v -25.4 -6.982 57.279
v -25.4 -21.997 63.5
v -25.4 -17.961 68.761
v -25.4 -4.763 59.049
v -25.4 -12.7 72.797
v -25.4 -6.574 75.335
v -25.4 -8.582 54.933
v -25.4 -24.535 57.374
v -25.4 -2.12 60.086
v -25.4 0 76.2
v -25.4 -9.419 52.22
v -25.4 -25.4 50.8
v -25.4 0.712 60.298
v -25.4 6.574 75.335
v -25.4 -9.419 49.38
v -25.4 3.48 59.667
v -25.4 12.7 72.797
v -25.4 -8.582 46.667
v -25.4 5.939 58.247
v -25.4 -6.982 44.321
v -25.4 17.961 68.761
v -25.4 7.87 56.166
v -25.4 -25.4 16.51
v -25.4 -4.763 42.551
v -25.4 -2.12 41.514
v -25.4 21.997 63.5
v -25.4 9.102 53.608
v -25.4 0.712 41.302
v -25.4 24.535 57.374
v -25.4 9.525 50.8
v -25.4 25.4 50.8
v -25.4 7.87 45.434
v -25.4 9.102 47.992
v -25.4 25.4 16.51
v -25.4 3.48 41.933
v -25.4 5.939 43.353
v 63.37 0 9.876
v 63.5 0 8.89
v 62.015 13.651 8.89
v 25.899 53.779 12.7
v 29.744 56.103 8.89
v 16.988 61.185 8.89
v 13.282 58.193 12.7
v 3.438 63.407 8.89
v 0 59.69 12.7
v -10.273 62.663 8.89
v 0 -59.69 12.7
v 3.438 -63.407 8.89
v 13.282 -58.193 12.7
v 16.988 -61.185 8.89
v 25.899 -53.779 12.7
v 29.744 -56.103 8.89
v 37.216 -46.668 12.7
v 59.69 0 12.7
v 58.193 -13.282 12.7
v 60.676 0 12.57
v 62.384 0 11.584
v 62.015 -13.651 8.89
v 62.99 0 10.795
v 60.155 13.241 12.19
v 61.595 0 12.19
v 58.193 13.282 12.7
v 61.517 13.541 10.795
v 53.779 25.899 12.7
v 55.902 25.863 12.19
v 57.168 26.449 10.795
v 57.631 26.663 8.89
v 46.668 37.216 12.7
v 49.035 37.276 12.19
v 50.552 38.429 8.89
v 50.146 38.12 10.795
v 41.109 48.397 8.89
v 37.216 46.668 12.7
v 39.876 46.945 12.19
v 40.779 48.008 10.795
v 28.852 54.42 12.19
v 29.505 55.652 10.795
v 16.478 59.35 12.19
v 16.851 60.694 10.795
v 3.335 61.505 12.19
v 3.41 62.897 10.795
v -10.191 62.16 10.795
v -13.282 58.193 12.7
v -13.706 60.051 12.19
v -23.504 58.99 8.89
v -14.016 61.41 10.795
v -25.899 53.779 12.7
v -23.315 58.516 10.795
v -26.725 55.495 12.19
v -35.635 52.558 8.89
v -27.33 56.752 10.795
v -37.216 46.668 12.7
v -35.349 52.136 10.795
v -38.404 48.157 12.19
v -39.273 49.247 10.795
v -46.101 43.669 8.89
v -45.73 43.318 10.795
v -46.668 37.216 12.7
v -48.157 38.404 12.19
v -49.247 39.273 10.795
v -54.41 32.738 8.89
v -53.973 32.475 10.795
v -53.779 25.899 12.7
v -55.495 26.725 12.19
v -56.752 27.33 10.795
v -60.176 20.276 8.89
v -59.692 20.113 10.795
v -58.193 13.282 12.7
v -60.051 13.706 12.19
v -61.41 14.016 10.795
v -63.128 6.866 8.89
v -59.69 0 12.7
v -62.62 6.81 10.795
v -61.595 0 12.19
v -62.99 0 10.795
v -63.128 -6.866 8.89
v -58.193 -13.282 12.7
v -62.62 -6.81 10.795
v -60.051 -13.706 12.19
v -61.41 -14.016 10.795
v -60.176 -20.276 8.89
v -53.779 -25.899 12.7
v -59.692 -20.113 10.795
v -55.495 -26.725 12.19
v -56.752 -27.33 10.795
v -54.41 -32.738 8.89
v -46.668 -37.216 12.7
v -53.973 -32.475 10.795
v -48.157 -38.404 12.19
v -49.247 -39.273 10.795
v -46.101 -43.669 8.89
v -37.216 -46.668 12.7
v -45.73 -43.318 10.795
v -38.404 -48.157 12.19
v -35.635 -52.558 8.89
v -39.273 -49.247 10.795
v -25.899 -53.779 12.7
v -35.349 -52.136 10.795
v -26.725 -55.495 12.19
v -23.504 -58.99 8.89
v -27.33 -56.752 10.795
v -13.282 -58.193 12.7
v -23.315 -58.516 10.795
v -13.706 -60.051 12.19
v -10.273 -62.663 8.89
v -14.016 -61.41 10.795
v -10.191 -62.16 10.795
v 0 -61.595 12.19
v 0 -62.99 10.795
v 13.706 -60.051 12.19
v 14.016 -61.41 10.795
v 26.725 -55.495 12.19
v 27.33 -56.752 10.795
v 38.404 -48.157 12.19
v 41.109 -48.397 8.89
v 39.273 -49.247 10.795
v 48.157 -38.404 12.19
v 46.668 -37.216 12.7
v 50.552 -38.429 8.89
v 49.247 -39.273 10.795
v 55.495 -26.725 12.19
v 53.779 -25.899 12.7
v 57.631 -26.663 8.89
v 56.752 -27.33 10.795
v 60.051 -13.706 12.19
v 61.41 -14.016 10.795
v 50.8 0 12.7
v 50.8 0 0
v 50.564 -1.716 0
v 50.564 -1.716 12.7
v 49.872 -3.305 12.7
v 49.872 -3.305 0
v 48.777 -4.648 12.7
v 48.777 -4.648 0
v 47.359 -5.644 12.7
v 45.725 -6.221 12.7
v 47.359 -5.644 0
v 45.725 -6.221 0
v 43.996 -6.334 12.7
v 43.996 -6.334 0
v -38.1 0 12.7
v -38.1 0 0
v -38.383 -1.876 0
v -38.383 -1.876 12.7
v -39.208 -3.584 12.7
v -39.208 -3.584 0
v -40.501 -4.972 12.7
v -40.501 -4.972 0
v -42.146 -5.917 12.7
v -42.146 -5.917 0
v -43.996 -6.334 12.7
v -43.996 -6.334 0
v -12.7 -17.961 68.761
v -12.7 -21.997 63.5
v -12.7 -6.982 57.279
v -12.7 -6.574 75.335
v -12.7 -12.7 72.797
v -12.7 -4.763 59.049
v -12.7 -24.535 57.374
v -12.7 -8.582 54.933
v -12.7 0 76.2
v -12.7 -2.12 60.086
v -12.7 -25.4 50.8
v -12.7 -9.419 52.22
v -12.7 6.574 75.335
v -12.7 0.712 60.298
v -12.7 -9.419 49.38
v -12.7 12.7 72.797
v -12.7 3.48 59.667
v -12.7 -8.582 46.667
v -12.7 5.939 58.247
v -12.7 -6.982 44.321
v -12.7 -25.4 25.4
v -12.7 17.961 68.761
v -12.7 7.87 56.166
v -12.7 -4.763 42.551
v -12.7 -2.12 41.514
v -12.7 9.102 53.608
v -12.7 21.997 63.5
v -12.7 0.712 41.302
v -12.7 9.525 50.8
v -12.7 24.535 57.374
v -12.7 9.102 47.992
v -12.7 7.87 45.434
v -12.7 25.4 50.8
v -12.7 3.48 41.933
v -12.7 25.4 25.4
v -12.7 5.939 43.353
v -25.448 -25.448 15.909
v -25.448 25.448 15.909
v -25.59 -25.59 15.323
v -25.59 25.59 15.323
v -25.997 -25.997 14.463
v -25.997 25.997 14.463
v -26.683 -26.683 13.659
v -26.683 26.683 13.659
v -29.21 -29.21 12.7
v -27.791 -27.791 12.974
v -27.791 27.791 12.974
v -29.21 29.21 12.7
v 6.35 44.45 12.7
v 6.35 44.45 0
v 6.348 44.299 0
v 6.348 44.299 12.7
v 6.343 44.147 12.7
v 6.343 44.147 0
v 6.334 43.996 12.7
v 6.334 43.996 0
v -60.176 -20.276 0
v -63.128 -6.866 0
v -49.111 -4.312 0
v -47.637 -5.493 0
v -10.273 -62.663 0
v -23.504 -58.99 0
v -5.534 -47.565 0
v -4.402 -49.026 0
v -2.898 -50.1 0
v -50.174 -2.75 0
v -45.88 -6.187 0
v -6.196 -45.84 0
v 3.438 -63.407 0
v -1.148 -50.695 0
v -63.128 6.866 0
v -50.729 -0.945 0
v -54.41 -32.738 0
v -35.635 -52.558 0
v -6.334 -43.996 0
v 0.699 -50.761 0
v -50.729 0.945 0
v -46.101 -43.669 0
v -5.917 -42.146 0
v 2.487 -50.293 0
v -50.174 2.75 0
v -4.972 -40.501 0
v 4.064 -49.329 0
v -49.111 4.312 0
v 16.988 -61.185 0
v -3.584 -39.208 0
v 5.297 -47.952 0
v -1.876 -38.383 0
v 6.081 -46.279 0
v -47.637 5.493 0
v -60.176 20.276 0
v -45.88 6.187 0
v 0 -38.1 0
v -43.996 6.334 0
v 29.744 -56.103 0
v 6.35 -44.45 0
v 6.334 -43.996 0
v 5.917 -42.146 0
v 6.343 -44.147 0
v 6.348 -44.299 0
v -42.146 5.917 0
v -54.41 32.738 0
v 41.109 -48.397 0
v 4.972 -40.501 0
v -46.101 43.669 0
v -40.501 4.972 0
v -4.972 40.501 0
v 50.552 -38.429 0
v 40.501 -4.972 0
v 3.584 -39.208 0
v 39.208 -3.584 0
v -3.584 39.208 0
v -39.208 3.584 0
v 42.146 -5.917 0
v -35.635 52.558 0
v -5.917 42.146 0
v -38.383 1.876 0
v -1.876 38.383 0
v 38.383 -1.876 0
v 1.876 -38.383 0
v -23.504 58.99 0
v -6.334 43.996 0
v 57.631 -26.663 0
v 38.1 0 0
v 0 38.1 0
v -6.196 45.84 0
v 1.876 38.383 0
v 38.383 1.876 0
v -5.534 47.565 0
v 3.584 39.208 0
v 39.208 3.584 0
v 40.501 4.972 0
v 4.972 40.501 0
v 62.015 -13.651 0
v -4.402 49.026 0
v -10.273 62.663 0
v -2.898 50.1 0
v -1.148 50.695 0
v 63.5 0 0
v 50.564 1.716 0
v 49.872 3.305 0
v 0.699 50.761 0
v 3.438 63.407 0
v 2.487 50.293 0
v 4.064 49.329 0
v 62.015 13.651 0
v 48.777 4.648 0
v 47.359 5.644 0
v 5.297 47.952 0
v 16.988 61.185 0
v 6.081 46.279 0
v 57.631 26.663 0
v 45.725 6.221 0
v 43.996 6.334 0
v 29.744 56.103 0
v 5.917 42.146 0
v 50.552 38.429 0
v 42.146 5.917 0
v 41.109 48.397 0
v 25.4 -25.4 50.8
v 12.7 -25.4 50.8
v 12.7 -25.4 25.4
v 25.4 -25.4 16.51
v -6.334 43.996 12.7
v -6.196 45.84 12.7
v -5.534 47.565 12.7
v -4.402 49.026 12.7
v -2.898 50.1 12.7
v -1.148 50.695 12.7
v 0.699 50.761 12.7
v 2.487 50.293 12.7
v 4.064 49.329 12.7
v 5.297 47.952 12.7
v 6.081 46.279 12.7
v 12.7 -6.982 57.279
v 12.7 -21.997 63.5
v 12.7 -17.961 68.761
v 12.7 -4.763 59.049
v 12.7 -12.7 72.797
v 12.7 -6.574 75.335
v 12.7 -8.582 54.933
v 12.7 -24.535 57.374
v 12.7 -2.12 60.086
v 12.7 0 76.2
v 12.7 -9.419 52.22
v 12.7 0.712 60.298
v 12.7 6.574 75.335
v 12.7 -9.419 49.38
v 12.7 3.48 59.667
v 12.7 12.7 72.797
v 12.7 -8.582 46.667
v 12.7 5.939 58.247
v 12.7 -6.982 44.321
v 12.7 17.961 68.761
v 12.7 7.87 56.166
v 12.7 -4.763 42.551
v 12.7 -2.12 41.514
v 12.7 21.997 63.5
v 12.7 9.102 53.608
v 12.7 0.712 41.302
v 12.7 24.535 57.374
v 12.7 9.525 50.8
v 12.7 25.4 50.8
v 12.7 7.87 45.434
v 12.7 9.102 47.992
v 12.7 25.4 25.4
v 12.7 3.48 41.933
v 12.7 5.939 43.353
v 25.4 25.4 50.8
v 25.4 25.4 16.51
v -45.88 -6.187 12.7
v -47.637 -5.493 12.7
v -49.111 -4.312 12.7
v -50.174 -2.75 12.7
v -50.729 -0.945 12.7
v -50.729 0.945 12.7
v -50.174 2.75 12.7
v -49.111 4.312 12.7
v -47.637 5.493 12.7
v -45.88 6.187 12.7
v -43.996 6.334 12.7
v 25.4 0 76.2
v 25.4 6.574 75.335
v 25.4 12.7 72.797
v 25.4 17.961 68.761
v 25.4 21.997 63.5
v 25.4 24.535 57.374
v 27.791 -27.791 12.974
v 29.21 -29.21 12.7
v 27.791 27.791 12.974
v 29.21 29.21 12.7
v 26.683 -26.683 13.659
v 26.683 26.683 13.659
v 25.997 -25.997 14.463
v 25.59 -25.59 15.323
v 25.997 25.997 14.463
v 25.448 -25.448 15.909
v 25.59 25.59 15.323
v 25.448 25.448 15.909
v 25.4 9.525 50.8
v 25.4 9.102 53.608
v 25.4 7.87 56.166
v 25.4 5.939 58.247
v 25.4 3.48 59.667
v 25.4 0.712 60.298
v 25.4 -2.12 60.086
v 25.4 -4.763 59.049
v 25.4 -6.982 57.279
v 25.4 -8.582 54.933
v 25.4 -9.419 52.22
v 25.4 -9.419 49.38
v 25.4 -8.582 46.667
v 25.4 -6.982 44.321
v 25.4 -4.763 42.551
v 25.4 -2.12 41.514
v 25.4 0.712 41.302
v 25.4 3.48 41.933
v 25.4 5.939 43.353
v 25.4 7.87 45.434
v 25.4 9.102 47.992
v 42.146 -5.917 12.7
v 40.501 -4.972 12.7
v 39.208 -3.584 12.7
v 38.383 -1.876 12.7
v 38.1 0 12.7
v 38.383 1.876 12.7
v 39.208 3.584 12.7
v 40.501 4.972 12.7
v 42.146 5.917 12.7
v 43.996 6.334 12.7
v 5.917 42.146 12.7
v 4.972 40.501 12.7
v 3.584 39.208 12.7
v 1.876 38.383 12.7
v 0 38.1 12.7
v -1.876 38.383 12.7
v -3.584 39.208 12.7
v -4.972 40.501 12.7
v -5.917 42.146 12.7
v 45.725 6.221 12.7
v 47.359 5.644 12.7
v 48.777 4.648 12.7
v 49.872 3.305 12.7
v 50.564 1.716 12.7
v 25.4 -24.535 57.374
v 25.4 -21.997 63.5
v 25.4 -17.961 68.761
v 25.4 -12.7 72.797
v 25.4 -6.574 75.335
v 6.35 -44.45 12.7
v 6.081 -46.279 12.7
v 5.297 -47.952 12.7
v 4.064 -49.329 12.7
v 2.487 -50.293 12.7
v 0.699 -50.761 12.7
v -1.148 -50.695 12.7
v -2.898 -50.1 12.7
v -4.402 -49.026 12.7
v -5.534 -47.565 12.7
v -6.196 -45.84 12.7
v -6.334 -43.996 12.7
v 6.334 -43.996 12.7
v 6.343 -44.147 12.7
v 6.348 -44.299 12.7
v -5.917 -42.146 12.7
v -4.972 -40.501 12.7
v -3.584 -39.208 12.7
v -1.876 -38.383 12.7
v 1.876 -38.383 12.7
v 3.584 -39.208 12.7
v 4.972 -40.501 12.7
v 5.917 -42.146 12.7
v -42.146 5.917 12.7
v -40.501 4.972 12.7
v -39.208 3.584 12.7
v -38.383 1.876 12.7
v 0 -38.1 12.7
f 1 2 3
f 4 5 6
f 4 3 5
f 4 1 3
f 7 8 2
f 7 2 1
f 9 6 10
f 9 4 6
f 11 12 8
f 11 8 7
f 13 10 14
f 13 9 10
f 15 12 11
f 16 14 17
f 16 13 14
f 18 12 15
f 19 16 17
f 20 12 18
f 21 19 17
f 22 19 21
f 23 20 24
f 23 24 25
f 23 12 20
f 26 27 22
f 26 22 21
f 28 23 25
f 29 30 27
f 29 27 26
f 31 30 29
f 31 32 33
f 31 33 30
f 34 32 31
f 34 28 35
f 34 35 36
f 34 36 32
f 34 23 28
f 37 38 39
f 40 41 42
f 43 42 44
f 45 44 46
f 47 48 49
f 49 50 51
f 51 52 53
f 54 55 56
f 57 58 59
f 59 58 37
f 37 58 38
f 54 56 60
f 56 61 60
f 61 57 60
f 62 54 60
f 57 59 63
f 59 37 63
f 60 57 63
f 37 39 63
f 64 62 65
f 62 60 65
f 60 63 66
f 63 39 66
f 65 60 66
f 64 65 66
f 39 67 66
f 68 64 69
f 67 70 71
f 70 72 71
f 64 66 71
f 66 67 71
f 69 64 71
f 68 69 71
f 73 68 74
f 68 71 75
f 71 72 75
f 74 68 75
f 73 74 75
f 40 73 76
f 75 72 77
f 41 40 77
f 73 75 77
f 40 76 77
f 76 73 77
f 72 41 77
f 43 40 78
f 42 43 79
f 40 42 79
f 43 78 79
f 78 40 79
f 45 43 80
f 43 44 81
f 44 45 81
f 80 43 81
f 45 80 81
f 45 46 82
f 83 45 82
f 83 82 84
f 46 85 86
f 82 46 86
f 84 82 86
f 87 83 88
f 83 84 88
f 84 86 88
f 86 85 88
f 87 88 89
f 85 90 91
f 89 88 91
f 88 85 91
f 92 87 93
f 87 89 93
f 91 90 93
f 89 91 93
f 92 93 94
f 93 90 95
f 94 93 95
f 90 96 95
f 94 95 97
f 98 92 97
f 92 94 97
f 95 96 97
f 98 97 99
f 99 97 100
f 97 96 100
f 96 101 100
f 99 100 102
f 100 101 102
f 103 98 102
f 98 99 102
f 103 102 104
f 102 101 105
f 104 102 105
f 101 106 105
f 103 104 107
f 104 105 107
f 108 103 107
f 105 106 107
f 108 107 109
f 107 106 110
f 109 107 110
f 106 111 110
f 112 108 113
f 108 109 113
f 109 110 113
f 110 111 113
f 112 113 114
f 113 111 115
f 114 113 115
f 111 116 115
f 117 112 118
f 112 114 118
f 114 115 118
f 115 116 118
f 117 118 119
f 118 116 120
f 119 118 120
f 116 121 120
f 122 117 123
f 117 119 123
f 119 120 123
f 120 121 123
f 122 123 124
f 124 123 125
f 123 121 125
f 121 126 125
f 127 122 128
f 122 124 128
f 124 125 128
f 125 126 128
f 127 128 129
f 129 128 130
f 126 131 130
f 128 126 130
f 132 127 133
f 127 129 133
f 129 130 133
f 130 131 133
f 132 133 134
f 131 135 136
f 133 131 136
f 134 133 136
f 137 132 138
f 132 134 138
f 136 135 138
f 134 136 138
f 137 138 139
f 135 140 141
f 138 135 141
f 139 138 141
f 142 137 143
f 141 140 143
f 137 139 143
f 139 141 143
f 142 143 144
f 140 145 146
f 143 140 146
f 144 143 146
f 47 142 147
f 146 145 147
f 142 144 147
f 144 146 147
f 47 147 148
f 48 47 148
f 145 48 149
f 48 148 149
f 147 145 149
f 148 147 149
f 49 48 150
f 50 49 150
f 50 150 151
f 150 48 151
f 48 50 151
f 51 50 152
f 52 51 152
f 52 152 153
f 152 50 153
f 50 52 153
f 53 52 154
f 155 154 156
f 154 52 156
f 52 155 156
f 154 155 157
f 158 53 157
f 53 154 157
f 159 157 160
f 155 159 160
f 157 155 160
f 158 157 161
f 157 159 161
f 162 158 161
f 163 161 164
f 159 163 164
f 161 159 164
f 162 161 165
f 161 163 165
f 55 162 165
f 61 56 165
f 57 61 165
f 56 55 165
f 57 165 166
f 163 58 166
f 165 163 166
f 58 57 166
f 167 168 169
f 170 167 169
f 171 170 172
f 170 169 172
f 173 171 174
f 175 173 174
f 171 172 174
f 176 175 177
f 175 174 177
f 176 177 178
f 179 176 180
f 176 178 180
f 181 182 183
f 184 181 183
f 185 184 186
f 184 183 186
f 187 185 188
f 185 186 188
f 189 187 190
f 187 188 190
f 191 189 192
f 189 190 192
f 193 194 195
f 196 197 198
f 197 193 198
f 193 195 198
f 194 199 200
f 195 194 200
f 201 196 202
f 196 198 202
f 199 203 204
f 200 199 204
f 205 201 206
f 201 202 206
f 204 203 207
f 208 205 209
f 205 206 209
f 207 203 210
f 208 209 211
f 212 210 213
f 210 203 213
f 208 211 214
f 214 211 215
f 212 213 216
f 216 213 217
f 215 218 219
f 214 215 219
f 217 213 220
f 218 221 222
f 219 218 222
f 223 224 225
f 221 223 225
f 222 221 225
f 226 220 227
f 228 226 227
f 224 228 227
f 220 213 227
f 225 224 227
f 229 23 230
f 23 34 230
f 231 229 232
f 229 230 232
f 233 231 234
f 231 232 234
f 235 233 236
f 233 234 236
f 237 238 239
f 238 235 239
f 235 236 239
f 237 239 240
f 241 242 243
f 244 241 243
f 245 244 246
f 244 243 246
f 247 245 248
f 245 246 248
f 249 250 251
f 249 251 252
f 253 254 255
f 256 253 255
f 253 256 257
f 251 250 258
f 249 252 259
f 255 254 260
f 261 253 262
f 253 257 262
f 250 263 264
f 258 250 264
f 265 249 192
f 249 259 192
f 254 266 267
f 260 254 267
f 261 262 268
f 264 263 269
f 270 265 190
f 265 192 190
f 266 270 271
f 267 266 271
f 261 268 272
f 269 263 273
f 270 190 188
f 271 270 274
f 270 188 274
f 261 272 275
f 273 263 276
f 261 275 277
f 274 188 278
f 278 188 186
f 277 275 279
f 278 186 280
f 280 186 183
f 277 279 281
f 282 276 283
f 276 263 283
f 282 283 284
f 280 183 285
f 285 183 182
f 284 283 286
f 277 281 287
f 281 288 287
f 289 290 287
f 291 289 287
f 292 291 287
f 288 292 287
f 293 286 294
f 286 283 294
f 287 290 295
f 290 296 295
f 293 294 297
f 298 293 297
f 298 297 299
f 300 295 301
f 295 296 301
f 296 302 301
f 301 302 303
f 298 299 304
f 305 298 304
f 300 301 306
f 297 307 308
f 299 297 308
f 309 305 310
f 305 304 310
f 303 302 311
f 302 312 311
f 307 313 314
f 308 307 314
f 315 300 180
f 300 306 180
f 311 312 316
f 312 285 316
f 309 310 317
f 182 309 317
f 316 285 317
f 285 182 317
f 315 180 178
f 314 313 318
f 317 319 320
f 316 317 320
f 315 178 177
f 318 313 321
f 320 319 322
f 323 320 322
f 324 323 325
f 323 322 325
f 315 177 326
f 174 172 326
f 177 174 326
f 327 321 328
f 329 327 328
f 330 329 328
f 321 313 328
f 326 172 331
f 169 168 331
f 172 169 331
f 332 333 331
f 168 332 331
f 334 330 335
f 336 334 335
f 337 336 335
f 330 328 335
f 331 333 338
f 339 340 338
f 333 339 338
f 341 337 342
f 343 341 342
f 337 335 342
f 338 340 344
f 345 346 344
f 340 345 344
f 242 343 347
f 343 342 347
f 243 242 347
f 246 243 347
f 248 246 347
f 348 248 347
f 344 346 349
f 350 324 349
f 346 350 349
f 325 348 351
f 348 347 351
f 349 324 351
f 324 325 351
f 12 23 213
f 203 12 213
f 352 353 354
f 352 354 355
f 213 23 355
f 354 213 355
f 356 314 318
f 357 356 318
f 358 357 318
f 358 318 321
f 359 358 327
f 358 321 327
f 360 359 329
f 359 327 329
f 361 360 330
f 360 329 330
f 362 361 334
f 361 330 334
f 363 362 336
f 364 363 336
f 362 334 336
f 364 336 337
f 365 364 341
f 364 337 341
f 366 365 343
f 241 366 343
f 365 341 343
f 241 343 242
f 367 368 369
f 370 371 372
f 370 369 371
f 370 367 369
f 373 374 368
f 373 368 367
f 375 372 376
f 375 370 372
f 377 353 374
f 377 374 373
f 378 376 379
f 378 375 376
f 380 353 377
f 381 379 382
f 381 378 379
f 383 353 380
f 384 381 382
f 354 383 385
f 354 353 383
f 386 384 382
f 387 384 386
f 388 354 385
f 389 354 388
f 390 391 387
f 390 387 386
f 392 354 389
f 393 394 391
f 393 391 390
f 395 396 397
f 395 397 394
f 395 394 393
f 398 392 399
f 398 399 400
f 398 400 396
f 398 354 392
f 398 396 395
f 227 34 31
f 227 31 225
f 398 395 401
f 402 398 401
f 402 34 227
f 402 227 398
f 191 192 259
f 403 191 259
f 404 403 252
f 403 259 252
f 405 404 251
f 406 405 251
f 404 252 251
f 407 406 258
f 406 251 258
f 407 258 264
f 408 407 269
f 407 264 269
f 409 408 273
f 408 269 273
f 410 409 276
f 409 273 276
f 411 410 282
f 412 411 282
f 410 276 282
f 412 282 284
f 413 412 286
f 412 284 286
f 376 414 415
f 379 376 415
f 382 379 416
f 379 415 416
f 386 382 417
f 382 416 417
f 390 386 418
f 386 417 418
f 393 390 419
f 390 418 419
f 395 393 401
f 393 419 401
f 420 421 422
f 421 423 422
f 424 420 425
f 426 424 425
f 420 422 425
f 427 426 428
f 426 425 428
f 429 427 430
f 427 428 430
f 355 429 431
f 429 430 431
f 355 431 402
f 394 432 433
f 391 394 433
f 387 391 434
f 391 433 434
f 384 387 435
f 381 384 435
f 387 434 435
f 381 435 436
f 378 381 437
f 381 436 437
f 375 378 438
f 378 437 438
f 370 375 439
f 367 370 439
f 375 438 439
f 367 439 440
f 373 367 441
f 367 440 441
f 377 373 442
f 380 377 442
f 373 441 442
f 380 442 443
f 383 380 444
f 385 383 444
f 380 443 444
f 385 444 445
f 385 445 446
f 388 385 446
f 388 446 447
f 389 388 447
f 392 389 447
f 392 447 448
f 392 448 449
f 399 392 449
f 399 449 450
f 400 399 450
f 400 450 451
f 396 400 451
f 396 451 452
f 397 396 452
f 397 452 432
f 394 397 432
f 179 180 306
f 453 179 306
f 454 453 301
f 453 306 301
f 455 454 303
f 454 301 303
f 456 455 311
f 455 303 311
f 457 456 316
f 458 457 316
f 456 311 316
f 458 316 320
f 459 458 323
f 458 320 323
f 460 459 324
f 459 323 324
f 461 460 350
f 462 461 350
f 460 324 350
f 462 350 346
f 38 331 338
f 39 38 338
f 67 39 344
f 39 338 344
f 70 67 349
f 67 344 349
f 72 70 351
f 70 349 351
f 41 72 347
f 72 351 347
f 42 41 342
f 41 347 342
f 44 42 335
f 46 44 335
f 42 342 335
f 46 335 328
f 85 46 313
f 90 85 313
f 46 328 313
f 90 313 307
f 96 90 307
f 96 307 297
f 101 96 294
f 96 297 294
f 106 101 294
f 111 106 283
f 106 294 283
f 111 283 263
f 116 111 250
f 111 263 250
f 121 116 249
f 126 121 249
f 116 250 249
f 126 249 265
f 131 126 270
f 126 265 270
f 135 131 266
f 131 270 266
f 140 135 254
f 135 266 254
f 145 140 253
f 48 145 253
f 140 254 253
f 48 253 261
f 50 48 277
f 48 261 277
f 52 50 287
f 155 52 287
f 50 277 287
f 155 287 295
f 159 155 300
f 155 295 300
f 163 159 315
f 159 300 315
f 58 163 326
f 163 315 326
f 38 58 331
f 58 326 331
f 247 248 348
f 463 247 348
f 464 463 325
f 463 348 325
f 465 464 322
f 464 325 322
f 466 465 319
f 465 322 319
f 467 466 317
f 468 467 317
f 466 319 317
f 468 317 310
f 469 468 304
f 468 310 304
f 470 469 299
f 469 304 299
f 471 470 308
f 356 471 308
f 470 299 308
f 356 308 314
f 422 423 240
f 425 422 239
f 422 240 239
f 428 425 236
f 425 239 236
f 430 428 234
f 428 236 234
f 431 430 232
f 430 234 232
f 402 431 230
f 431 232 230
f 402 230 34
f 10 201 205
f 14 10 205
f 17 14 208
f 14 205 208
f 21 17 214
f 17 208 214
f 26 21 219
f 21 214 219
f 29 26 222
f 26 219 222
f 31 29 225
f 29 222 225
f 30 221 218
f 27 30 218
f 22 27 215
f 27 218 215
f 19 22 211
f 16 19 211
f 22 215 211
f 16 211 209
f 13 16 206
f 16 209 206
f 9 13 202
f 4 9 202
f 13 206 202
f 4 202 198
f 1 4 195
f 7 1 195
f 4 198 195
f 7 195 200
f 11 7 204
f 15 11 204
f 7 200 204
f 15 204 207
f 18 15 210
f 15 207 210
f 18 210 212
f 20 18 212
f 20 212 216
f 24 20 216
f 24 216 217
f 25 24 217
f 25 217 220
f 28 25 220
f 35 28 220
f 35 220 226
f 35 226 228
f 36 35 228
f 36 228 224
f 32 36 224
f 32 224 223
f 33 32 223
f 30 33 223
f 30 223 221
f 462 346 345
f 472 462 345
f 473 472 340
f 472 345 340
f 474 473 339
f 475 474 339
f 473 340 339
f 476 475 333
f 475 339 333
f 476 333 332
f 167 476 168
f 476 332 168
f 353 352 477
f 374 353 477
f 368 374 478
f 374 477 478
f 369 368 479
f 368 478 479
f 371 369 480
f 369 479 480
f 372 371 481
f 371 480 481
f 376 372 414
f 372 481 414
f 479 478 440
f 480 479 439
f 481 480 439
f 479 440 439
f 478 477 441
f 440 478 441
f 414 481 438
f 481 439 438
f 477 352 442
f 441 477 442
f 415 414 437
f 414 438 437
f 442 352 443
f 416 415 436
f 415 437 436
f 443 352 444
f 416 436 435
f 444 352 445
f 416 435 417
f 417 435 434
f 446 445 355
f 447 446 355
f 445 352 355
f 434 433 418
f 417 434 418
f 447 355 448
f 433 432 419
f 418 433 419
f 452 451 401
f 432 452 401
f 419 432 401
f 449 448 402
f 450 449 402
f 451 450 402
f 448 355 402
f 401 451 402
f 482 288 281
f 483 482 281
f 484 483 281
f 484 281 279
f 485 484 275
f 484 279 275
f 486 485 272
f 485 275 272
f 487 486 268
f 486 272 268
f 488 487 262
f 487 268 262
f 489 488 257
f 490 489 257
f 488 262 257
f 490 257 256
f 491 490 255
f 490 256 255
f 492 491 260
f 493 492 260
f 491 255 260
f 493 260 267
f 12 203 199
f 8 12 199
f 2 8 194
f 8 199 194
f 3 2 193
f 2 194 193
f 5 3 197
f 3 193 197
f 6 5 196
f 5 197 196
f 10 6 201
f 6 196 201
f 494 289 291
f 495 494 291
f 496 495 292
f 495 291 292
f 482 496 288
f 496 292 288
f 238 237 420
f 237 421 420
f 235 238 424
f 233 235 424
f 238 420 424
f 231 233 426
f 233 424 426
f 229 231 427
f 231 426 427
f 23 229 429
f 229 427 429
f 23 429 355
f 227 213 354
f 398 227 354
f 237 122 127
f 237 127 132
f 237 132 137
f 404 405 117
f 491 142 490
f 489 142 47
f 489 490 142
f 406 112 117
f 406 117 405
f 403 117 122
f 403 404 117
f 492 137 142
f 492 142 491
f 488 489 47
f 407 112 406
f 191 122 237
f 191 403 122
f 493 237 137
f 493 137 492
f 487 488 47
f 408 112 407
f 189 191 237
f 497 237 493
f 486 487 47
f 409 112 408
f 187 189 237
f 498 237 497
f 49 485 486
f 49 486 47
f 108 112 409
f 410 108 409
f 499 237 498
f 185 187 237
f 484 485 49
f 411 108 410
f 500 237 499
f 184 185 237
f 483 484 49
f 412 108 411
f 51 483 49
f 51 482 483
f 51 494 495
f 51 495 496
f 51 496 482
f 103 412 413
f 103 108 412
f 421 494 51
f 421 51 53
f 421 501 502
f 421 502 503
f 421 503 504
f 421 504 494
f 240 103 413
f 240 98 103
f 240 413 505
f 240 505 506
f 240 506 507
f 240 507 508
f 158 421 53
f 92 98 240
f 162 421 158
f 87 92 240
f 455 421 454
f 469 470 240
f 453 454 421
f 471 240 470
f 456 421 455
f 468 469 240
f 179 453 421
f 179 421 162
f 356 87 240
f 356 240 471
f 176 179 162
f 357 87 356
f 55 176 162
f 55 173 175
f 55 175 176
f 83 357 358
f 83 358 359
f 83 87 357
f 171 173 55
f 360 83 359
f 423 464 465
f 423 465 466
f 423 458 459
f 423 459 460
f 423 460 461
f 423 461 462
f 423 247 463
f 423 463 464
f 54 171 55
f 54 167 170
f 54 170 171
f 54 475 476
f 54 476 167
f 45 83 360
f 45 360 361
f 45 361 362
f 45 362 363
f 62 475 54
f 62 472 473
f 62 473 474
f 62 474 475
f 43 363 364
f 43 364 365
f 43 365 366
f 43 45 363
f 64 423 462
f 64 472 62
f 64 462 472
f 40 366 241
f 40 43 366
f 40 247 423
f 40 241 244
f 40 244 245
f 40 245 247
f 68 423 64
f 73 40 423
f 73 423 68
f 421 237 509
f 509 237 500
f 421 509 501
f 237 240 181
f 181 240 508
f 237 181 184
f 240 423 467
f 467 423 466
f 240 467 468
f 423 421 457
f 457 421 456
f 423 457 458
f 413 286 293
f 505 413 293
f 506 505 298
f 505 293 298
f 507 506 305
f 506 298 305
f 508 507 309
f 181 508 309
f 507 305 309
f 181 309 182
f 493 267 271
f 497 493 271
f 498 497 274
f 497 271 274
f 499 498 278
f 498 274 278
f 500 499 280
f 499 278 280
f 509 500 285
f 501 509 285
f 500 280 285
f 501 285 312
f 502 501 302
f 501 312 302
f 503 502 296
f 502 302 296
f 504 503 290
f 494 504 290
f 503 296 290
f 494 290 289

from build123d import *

# Parameters (mm, degrees)
F0_R     = 63.5
F1_DEPTH = 12.7
F2_W     = 25.4
F2_H     = 50.8
F3_DEPTH = 12.7
F2_W_2   = 12.7
F4_DEPTH = 63.5
F6_DEPTH = 88.901
F5_R     = 9.525
F7_DEPTH = 88.901
F8_R     = 3.81


with BuildPart() as f1:
    # F0 (on Top) → F1 (new body)
    with BuildSketch(Plane.XY):
        Circle(F0_R)
        with BuildLine():
            ThreePointArc((-6.33378, 43.996429), (-0.226931, 50.795944), (6.35, 44.45))
            ThreePointArc((6.35, 44.45), (6.345944, 44.223069), (6.33378, 43.996429))
            ThreePointArc((6.33378, 43.996429), (31.430896, 31.430896), (43.996429, 6.33378))
            ThreePointArc((43.996429, 6.33378), (48.776796, 4.647724), (50.8, 0))
            ThreePointArc((50.8, 0), (48.776796, -4.647724), (43.996429, -6.33378))
            ThreePointArc((43.996429, -6.33378), (31.430896, -31.430896), (6.33378, -43.996429))
            ThreePointArc((6.33378, -43.996429), (6.345944, -44.223069), (6.35, -44.45))
            ThreePointArc((6.35, -44.45), (-0.226931, -50.795944), (-6.33378, -43.996429))
            ThreePointArc((-6.33378, -43.996429), (-31.430896, -31.430896), (-43.996429, -6.33378))
            ThreePointArc((-43.996429, -6.33378), (-50.8, 0), (-43.996429, 6.33378))
            ThreePointArc((-43.996429, 6.33378), (-31.430896, 31.430896), (-6.33378, 43.996429))
        make_face(mode=Mode.SUBTRACT)
        with BuildLine():
            ThreePointArc((6.33378, 43.996429), (0, 38.1), (-6.33378, 43.996429))
            ThreePointArc((-6.33378, 43.996429), (-31.430896, 31.430896), (-43.996429, 6.33378))
            ThreePointArc((-43.996429, 6.33378), (-39.802276, 4.326796), (-38.1, 0))
            ThreePointArc((-38.1, 0), (-39.802276, -4.326796), (-43.996429, -6.33378))
            ThreePointArc((-43.996429, -6.33378), (-31.430896, -31.430896), (-6.33378, -43.996429))
            ThreePointArc((-6.33378, -43.996429), (0, -38.1), (6.33378, -43.996429))
            ThreePointArc((6.33378, -43.996429), (31.430896, -31.430896), (43.996429, -6.33378))
            ThreePointArc((43.996429, -6.33378), (38.1, 0), (43.996429, 6.33378))
            ThreePointArc((43.996429, 6.33378), (31.430896, 31.430896), (6.33378, 43.996429))
        make_face()
    extrude(amount=F1_DEPTH)

    # F2 (on face) → F3 (join)
    with BuildSketch(Plane.XY.offset(12.7)):
        Rectangle(F2_W, F2_H)
    extrude(amount=F3_DEPTH)

    # F2 (on face) → F4 (join)
    with BuildSketch(Plane.XY.offset(12.7)):
        with Locations((-19.05, 0)):
            Rectangle(F2_W_2, F2_H)
        with Locations((19.05, 0)):
            Rectangle(F2_W_2, F2_H)
    extrude(amount=F4_DEPTH)

    # F5 (on face) → F6 (cut, through all)
    with BuildSketch(Plane.YZ.offset(25.4)):
        with BuildLine():
            Line((25.4, 76.2), (0, 76.2))
            ThreePointArc((0, 76.2), (17.960512, 68.760512), (25.4, 50.8))
            Line((25.4, 50.8), (25.4, 76.2))
        make_face()
        with BuildLine():
            ThreePointArc((-25.4, 50.8), (-17.960512, 68.760512), (0, 76.2))
            Line((0, 76.2), (-25.4, 76.2))
            Line((-25.4, 76.2), (-25.4, 50.8))
        make_face()
    extrude(amount=-F6_DEPTH, mode=Mode.SUBTRACT)

    # F5 (on face) → F7 (cut, through all)
    with BuildSketch(Plane.YZ.offset(25.4)):
        with Locations((0, 50.8)):
            Circle(F5_R)
    extrude(amount=-F7_DEPTH, mode=Mode.SUBTRACT)

    # F8
    f8_edges = [f1.edges().sort_by_distance(p)[0] for p in [
        (-63.5, 0, 12.7),
        (0, -25.4, 12.7),
        (25.4, 0, 12.7),
        (0, 25.4, 12.7),
        (-25.4, 0, 12.7),
    ]]
    fillet(f8_edges, radius=F8_R)


solid = f1.part
